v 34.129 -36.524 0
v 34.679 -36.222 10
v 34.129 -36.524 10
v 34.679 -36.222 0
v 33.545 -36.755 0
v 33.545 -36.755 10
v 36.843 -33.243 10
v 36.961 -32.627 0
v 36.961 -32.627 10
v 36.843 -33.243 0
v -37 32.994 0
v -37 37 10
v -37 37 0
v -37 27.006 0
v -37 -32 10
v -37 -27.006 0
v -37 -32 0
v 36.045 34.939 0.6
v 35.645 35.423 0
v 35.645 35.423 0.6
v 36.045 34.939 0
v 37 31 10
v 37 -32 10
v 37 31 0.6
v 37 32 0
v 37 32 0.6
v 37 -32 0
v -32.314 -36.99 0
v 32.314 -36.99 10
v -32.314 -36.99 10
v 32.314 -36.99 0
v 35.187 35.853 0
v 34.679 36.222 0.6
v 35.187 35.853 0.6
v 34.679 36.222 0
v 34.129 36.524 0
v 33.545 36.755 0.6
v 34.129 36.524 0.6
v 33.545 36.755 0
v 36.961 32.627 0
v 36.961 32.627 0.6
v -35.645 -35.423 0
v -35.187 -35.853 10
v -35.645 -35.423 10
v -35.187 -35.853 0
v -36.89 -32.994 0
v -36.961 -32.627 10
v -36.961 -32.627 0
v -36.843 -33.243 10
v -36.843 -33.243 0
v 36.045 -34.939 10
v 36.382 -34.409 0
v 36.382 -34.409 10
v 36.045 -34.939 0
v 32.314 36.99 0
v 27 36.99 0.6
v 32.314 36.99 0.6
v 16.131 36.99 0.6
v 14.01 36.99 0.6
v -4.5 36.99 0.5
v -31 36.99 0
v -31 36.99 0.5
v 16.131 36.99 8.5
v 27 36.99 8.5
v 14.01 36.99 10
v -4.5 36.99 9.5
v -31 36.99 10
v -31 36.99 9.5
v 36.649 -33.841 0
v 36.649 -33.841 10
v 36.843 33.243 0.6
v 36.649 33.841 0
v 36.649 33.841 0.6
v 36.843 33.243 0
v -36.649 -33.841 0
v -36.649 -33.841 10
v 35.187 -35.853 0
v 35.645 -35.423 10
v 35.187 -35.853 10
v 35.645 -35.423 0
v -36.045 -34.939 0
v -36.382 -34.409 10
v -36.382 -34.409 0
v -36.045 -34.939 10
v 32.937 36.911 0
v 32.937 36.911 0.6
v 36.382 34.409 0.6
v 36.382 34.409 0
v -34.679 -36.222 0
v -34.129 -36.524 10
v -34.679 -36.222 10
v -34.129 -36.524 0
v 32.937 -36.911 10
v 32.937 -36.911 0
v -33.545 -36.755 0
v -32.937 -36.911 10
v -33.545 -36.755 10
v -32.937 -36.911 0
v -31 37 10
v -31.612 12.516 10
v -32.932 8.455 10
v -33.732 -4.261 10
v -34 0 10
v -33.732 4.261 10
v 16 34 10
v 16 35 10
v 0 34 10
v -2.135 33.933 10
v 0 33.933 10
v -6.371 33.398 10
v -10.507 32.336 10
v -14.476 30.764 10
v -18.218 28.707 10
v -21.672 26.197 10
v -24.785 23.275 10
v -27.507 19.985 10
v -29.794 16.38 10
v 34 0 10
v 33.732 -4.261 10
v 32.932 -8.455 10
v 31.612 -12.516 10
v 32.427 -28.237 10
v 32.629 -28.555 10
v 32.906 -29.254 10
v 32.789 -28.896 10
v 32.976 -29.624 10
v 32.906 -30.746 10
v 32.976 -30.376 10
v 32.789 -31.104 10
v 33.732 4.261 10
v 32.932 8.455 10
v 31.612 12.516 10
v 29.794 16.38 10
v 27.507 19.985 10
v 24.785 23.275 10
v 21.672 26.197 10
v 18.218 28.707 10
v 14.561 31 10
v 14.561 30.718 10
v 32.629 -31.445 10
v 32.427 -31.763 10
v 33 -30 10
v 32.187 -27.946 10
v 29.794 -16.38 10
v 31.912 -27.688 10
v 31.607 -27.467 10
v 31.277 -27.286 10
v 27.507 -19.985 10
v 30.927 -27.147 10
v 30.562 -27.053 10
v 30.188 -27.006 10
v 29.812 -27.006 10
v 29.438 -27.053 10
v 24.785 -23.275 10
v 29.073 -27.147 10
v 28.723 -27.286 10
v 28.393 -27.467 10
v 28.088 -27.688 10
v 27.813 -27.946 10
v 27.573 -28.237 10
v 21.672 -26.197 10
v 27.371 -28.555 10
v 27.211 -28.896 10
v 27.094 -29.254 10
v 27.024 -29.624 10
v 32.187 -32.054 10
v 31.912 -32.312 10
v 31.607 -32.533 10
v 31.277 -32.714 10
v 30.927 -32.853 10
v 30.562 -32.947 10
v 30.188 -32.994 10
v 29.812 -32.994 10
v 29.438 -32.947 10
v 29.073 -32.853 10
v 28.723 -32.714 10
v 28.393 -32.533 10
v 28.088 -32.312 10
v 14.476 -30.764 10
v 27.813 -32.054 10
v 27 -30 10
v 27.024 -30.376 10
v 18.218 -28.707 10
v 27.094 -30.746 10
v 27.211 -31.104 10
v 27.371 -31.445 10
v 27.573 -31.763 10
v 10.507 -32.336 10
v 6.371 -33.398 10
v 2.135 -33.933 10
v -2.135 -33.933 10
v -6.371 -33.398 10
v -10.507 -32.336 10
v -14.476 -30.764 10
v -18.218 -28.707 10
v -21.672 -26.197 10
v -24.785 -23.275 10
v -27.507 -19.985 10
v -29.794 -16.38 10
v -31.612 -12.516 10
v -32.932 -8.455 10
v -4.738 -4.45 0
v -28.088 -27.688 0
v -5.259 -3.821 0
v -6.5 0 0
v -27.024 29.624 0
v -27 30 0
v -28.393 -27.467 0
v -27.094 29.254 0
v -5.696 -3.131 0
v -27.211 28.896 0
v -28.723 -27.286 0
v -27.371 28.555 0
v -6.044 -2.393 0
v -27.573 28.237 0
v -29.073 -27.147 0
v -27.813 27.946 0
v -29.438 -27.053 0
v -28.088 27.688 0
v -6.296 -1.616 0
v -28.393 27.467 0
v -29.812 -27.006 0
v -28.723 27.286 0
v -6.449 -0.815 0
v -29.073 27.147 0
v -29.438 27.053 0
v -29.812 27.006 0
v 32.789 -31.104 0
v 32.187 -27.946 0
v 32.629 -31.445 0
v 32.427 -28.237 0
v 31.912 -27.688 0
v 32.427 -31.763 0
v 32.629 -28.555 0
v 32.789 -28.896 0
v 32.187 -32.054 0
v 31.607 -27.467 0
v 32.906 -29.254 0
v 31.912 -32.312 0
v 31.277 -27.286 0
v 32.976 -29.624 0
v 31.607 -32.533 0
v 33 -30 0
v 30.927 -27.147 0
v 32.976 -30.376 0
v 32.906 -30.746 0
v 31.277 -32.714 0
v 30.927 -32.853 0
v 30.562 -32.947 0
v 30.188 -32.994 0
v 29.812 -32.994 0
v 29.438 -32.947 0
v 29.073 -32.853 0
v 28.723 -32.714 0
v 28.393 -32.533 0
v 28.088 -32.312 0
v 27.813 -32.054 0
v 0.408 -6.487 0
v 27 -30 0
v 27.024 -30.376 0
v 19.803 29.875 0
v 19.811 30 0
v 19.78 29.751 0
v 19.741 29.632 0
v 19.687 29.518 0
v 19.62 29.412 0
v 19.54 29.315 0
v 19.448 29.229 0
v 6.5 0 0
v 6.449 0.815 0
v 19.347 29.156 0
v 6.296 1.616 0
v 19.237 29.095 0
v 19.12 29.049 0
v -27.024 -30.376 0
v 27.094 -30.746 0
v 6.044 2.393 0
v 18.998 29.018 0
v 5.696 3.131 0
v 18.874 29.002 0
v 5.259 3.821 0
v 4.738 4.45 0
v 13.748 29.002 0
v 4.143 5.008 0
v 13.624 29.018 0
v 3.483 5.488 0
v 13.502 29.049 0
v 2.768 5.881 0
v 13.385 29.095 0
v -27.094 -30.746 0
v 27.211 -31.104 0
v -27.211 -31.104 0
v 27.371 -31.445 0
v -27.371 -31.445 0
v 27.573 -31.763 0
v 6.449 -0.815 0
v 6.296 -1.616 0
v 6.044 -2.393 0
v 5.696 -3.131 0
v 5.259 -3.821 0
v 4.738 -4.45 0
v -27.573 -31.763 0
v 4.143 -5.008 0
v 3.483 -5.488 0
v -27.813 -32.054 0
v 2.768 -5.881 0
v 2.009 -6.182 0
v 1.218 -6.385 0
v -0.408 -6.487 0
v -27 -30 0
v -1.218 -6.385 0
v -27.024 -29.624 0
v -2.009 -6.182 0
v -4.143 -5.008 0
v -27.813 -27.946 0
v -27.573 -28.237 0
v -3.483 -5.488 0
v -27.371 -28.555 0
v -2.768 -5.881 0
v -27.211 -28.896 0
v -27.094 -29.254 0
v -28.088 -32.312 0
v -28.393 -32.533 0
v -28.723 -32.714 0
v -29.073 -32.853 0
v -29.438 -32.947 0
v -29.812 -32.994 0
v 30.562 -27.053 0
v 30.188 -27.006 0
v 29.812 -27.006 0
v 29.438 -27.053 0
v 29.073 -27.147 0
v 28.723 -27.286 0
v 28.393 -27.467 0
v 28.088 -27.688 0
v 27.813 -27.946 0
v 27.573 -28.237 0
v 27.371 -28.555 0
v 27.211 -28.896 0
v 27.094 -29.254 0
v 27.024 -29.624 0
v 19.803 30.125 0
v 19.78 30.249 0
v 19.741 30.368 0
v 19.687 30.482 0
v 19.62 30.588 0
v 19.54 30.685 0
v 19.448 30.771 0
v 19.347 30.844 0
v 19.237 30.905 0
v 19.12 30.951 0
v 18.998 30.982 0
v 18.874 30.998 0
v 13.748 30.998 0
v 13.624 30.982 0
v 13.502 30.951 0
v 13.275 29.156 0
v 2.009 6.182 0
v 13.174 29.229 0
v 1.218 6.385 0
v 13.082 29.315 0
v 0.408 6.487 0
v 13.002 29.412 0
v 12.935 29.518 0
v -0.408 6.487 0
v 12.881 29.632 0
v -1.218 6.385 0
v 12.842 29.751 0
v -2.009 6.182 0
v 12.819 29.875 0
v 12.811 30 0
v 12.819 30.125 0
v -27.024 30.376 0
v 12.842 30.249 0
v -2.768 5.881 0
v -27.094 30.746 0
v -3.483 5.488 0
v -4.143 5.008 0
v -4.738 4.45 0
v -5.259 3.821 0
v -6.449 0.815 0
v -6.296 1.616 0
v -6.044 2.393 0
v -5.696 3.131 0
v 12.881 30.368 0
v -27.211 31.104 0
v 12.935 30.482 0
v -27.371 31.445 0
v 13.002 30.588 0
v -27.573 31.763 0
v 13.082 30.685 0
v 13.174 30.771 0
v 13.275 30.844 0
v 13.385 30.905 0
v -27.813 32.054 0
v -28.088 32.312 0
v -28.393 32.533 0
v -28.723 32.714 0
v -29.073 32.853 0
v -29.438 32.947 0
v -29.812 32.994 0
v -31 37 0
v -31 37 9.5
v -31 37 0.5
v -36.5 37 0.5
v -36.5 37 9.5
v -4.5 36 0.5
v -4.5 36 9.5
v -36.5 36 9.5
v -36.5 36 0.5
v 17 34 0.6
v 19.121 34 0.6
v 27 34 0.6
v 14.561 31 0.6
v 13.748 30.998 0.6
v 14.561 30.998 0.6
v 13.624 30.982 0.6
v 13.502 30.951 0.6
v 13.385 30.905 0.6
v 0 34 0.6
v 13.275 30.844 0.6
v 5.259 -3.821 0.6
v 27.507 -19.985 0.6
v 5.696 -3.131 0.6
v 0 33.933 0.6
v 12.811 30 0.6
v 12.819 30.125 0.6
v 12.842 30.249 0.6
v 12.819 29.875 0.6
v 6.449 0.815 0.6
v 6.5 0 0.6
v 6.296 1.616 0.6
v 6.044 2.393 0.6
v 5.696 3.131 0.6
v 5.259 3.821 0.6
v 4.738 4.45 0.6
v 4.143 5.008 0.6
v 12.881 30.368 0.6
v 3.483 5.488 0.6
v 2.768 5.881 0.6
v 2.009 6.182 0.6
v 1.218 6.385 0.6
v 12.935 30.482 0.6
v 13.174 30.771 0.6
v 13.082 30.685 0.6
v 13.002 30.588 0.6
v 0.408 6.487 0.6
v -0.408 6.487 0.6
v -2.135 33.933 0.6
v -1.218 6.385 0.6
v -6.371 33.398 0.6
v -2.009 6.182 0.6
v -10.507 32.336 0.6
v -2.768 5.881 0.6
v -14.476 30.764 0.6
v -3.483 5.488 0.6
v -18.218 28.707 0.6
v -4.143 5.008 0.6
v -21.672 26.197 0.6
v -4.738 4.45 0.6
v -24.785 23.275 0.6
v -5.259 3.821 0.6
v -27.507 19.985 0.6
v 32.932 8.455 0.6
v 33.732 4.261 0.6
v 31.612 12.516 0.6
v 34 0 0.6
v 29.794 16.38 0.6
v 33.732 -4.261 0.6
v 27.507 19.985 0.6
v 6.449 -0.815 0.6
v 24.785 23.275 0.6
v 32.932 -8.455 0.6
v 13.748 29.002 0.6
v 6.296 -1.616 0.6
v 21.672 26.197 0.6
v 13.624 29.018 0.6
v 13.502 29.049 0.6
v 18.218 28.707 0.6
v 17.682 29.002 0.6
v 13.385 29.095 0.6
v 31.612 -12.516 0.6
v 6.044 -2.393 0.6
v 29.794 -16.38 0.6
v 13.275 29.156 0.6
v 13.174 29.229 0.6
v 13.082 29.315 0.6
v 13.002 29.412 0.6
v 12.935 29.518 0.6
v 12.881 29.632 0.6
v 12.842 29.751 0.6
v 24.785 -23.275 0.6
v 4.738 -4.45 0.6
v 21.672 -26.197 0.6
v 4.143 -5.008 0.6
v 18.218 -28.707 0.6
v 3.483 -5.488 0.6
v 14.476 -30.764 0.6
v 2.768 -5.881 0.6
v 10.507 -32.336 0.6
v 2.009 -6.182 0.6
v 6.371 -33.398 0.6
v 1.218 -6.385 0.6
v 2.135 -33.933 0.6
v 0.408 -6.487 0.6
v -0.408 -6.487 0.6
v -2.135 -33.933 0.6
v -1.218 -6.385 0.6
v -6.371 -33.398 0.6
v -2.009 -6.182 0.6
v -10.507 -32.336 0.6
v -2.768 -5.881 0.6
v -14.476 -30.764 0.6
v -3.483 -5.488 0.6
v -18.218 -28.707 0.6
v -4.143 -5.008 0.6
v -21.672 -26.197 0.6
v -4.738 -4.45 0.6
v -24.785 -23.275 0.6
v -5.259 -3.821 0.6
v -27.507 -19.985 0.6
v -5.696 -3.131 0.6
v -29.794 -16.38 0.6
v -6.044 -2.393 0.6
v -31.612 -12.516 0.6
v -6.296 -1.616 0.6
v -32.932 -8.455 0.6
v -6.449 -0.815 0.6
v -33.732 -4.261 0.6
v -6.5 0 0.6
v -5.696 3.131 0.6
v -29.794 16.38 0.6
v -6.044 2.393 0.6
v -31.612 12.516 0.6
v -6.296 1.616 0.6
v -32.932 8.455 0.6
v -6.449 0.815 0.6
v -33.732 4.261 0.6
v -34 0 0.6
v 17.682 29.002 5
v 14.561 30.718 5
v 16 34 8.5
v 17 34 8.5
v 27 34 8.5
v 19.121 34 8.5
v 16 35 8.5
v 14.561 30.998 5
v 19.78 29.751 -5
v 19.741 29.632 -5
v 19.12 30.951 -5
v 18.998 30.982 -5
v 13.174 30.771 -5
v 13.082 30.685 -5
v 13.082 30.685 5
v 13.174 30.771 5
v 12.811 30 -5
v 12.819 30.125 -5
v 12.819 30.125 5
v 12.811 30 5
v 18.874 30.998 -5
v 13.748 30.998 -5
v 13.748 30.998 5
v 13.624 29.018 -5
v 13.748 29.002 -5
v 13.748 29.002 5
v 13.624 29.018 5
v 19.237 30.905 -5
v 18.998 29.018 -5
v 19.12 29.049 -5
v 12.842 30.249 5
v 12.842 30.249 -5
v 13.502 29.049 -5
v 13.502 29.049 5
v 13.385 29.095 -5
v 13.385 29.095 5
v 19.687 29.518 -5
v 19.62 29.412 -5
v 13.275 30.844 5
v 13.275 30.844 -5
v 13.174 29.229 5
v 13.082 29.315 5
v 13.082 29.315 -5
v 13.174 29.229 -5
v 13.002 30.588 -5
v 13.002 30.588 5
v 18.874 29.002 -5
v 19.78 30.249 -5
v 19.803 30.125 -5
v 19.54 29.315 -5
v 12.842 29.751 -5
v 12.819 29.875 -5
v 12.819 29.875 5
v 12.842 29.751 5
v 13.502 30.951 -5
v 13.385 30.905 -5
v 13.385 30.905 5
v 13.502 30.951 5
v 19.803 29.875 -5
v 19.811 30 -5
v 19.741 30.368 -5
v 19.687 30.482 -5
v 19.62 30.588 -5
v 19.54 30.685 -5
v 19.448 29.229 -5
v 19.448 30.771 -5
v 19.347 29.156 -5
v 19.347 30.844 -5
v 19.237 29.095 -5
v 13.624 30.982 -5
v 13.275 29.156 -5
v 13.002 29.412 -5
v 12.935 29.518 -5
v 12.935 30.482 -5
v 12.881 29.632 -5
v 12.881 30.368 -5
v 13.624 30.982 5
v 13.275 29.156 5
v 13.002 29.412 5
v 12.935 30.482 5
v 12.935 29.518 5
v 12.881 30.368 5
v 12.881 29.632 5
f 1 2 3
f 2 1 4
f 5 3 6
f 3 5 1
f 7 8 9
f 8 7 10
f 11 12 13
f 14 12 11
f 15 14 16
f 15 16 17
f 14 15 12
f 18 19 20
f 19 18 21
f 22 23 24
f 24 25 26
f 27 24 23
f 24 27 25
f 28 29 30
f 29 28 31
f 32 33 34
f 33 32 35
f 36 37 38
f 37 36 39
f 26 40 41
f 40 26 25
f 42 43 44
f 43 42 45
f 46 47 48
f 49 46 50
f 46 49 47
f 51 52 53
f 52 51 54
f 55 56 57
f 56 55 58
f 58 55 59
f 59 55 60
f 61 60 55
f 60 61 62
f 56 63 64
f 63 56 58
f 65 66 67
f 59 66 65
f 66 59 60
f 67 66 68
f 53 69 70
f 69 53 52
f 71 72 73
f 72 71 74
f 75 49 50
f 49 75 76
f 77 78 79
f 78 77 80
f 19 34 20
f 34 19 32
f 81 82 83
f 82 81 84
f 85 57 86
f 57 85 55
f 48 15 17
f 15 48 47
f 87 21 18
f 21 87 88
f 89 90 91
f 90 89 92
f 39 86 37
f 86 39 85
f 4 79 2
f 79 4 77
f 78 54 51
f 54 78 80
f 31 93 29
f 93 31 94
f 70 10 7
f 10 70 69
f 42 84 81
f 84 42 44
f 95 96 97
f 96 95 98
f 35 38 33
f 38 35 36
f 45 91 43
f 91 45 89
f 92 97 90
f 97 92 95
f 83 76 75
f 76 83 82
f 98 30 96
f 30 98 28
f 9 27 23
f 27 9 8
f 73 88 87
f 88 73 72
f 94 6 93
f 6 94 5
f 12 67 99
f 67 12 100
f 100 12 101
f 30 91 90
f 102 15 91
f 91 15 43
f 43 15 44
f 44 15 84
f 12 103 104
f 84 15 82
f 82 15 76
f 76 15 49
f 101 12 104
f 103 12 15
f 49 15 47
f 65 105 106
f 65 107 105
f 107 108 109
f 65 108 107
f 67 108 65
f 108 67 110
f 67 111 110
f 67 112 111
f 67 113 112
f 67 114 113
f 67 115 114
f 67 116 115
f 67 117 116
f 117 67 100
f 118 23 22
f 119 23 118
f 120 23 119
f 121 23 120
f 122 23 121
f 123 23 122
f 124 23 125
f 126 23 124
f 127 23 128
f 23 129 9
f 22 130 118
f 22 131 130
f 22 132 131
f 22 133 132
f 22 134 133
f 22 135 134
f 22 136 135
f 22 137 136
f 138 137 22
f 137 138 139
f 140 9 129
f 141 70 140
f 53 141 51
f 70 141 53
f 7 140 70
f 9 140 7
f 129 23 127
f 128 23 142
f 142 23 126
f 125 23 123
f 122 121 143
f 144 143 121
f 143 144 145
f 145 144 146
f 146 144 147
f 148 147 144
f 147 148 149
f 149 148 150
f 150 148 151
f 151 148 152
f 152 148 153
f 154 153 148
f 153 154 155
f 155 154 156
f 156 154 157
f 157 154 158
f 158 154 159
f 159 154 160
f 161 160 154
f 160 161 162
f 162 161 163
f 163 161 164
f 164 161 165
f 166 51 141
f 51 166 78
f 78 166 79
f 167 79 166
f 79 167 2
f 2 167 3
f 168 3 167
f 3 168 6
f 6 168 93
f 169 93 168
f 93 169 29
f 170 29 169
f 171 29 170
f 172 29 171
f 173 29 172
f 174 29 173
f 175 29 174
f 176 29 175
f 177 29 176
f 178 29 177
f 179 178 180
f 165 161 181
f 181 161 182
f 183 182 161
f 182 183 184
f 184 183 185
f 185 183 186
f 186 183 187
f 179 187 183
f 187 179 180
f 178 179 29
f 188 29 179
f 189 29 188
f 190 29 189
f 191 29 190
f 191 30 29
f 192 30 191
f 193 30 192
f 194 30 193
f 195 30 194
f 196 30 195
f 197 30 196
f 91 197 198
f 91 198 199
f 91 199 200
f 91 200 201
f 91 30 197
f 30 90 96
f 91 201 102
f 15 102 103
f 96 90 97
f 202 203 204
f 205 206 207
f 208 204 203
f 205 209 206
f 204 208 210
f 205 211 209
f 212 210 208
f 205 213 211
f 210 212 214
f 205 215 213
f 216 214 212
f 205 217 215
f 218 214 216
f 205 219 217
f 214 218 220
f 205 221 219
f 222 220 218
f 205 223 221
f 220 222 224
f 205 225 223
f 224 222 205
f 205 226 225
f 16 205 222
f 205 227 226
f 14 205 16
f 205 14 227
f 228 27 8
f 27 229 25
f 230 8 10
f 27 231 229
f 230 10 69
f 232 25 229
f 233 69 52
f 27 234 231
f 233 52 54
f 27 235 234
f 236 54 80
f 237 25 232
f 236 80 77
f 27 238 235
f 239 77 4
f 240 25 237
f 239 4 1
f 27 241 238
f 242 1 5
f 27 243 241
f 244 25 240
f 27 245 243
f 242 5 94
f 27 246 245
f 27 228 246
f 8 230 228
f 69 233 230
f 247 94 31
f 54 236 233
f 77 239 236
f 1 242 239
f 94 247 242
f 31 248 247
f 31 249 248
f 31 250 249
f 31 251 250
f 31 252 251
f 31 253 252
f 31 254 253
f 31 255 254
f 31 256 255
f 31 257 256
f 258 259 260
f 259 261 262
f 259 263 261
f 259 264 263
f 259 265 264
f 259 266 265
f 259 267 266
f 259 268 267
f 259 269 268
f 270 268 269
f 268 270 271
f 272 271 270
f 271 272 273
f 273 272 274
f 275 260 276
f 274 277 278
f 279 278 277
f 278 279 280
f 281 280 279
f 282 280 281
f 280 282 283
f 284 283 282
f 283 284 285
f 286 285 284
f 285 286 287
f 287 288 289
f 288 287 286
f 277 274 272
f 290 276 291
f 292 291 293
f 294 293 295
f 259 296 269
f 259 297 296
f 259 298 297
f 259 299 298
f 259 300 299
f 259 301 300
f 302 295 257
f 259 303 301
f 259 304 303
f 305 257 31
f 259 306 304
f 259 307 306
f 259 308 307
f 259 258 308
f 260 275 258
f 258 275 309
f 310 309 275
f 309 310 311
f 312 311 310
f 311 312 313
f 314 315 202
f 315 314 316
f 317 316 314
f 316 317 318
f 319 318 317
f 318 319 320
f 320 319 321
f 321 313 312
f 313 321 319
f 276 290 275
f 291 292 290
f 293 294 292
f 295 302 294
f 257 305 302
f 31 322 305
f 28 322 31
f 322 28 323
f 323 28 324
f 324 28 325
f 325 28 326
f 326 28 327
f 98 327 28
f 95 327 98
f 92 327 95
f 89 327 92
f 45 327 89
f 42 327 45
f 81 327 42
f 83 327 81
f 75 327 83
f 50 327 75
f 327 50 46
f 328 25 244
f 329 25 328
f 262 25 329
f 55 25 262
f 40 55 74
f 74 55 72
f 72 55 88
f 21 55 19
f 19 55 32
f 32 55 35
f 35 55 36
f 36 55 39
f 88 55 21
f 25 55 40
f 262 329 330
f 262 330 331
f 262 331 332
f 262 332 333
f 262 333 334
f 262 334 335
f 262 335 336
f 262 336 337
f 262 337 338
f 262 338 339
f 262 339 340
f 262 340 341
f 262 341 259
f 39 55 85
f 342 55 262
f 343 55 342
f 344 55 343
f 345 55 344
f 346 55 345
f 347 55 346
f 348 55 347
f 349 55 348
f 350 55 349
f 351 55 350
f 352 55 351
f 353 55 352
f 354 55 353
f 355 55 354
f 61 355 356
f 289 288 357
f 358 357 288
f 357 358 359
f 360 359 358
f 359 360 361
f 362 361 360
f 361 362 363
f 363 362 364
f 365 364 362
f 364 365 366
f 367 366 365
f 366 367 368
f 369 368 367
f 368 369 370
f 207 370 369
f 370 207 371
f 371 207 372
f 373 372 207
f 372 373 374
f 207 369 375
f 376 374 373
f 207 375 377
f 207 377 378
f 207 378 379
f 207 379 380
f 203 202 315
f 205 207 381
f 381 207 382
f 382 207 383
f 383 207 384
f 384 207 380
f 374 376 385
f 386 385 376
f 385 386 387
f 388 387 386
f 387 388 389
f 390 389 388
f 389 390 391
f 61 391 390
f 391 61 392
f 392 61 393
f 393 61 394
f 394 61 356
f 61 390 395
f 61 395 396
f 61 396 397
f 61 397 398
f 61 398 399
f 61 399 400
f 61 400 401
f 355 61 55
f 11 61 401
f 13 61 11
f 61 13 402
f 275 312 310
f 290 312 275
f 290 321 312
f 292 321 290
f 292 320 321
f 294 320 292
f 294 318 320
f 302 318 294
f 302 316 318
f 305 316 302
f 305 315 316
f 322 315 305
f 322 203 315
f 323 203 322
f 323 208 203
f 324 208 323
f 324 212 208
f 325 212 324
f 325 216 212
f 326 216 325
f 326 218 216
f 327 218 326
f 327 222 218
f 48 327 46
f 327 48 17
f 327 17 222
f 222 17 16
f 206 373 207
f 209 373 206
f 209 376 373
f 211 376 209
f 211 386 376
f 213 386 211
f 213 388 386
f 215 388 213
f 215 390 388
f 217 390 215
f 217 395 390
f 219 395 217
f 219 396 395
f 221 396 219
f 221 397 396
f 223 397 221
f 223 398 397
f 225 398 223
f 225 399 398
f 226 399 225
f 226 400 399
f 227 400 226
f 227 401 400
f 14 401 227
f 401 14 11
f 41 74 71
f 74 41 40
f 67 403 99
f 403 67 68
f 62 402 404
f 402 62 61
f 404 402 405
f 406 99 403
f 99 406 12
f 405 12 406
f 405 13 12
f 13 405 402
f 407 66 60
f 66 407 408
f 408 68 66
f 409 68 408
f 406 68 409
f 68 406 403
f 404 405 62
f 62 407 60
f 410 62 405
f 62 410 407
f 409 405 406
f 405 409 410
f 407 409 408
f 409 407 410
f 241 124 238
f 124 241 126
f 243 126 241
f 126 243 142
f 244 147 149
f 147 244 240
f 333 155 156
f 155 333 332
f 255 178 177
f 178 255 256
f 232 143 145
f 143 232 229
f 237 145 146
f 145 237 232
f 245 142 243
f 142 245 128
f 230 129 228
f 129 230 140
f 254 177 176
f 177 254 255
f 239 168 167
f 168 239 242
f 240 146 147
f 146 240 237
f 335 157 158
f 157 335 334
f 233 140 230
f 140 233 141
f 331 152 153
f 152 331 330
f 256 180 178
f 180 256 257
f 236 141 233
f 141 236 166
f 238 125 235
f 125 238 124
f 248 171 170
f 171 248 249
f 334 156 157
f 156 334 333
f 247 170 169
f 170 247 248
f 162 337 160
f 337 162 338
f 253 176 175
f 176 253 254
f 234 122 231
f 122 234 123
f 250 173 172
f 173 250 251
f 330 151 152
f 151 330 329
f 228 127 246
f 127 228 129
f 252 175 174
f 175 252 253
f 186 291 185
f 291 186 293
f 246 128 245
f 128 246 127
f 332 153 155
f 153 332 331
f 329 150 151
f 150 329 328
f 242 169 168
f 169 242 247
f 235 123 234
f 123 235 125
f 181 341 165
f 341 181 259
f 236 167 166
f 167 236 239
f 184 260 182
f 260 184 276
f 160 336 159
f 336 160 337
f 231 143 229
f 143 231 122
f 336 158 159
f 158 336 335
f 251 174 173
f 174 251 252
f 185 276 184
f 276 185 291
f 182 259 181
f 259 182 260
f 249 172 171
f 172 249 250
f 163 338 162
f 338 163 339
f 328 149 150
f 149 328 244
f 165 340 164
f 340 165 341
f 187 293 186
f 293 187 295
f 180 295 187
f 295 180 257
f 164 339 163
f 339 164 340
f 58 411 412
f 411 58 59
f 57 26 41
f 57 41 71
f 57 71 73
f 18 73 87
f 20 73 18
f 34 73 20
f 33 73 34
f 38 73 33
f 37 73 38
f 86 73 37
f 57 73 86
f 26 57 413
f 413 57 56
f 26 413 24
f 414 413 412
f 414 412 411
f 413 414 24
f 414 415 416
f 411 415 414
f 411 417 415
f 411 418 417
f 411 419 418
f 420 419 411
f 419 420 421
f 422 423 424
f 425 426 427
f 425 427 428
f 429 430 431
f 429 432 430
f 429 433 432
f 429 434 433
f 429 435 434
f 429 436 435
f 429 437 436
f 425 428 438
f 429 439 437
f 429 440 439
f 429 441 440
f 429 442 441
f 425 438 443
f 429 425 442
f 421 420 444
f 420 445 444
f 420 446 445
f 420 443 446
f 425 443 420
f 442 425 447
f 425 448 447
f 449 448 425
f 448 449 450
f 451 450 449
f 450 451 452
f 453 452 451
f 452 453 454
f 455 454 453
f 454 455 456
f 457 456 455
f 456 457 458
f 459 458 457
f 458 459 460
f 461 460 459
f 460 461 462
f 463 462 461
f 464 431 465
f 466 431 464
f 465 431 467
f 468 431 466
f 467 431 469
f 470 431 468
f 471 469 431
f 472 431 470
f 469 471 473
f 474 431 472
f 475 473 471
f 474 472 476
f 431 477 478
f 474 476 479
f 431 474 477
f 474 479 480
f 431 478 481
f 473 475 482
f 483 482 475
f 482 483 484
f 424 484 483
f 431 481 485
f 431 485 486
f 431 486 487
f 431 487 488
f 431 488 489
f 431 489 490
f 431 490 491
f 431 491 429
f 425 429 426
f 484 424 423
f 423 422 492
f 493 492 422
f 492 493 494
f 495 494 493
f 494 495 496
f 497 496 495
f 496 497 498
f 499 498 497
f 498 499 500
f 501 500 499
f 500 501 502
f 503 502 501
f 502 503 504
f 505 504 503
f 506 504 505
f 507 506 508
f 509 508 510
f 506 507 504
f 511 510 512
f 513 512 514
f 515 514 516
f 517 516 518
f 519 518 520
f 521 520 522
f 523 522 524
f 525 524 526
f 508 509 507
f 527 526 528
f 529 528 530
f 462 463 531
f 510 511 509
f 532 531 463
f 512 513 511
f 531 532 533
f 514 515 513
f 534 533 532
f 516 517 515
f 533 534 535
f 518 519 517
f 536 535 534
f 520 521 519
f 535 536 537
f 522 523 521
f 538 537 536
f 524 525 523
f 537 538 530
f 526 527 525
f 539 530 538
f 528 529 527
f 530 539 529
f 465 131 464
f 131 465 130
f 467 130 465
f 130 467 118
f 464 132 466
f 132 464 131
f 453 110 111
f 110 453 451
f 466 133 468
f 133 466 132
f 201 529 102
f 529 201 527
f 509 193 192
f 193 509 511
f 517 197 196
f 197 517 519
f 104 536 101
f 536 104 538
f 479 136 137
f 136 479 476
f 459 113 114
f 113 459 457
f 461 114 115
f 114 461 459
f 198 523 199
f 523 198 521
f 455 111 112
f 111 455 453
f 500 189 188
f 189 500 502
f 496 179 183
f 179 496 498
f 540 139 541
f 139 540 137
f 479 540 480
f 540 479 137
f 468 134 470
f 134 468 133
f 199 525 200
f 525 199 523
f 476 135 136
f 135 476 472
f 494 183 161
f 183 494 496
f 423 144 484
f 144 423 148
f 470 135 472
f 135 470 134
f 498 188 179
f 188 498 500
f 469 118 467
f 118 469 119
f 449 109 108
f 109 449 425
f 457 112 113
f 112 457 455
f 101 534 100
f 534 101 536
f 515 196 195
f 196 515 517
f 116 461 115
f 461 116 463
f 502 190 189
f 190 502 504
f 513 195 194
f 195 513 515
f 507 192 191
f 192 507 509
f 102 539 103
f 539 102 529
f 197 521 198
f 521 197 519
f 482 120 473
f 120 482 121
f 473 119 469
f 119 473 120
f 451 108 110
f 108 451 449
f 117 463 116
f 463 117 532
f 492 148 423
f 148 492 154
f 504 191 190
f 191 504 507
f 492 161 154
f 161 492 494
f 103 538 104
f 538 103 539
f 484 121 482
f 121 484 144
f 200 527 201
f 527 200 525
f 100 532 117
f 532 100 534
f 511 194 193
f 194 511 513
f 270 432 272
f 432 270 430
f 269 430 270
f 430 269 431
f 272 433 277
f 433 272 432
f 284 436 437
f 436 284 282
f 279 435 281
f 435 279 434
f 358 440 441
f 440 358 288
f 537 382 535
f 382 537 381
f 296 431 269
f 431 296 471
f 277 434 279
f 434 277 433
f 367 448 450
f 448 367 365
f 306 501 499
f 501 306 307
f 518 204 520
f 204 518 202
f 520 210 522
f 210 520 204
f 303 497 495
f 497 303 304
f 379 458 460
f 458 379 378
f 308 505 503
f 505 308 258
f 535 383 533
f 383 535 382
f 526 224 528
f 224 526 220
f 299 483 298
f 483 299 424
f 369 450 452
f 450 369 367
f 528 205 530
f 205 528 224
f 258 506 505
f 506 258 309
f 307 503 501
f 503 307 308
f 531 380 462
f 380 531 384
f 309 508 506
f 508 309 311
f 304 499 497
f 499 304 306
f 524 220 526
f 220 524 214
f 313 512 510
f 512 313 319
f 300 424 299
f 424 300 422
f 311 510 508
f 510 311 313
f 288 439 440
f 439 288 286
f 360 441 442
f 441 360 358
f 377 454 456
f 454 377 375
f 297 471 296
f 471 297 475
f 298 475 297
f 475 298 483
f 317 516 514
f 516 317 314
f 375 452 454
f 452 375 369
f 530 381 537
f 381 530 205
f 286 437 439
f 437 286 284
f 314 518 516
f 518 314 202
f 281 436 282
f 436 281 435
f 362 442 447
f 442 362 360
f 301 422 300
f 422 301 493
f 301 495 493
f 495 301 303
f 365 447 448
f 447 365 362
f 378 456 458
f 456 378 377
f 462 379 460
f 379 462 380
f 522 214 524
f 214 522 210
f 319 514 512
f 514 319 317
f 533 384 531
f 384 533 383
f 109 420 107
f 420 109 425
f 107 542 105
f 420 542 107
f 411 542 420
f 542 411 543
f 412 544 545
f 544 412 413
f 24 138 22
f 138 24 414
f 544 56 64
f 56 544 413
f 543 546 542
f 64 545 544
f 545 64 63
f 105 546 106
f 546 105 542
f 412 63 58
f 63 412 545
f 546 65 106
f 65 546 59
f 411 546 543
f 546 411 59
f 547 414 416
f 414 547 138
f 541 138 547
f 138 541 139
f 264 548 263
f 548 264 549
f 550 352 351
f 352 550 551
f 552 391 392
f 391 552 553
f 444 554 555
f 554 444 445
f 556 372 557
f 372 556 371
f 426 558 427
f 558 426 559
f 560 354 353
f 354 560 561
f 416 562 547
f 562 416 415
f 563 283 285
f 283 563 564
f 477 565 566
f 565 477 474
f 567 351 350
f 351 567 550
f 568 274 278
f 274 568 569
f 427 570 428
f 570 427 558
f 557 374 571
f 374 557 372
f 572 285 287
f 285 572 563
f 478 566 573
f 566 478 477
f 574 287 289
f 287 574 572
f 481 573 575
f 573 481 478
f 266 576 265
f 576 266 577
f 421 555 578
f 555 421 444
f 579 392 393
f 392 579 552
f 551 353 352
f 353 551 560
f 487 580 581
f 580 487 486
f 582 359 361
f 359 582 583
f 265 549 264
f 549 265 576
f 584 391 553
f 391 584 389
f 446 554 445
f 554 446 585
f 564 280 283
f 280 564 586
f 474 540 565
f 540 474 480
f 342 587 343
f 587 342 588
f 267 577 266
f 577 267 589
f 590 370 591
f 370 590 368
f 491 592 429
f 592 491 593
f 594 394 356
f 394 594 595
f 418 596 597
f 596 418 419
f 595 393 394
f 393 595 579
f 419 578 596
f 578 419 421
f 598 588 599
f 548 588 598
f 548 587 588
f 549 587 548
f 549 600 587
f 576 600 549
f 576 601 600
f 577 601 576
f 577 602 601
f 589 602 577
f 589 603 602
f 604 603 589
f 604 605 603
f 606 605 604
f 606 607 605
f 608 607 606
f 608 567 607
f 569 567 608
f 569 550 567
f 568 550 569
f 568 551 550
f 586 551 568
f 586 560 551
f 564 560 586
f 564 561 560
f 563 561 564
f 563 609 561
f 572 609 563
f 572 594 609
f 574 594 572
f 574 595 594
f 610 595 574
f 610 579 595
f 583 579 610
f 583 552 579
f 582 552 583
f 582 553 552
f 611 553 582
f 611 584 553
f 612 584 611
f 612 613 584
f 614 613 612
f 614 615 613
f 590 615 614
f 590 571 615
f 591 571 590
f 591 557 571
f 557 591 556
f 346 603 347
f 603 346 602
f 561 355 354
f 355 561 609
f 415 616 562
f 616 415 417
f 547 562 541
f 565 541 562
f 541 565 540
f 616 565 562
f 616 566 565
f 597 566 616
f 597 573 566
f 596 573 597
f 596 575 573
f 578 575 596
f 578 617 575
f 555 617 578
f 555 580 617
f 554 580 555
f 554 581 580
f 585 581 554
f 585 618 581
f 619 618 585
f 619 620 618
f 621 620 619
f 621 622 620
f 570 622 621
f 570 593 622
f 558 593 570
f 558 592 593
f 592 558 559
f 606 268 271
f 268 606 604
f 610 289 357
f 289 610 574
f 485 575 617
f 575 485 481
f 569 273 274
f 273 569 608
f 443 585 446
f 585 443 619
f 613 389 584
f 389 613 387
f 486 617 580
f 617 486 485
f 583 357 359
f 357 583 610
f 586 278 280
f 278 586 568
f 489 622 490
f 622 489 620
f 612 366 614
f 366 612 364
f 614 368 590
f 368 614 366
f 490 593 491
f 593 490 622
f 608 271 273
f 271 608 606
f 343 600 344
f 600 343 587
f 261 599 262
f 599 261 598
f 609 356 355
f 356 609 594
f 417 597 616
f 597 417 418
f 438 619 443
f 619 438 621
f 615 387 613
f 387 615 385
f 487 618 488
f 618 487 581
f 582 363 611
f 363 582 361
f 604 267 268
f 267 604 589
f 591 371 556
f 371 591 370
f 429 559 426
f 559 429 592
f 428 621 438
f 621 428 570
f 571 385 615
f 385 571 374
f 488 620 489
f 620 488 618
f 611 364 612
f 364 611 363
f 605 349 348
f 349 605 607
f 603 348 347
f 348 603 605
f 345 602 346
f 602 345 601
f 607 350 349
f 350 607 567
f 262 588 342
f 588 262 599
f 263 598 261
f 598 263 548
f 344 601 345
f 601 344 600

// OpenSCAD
$fn = 50;


union() {
	difference() {
		union() {
			hull() {
				translate(v = [-32.0000000000, 32.0000000000, 0]) {
					cylinder(h = 10, r = 5);
				}
				translate(v = [32.0000000000, 32.0000000000, 0]) {
					cylinder(h = 10, r = 5);
				}
				translate(v = [-32.0000000000, -32.0000000000, 0]) {
					cylinder(h = 10, r = 5);
				}
				translate(v = [32.0000000000, -32.0000000000, 0]) {
					cylinder(h = 10, r = 5);
				}
			}
			translate(v = [-37.0000000000, 31.0000000000, 0]) {
				cube(size = [6, 6, 10]);
			}
		}
		union() {
			translate(v = [-37.5000000000, -30.0000000000, -250.0000000000]) {
				rotate(a = [0, 0, 0]) {
					difference() {
						union() {
							hull() {
								translate(v = [7.5000000000, 0, 0]) {
									cylinder(h = 250, r = 3.0000000000, r1 = 3.0000000000, r2 = 3.0000000000);
								}
								translate(v = [-7.5000000000, 0, 0]) {
									cylinder(h = 250, r = 3.0000000000, r1 = 3.0000000000, r2 = 3.0000000000);
								}
							}
						}
						union();
					}
				}
			}
			translate(v = [-37.5000000000, 30.0000000000, -250.0000000000]) {
				rotate(a = [0, 0, 0]) {
					difference() {
						union() {
							hull() {
								translate(v = [7.5000000000, 0, 0]) {
									cylinder(h = 250, r = 3.0000000000, r1 = 3.0000000000, r2 = 3.0000000000);
								}
								translate(v = [-7.5000000000, 0, 0]) {
									cylinder(h = 250, r = 3.0000000000, r1 = 3.0000000000, r2 = 3.0000000000);
								}
							}
						}
						union();
					}
				}
			}
			translate(v = [-36.5000000000, 36.0000000000, 0.5000000000]) {
				cube(size = [32, 1, 9.0000000000]);
			}
			translate(v = [30.0000000000, -30.0000000000, 0]) {
				cylinder(h = 100, r = 3.0000000000);
			}
			translate(v = [0, 0, 0.6000000000]) {
				cylinder(h = 12.4000000000, r = 34.0000000000);
			}
			translate(v = [0, 0, -5.0000000000]) {
				cylinder(h = 10, r = 6.5000000000);
			}
			translate(v = [0.0000000000, 31.0000000000, 0.6000000000]) {
				cube(size = [37.0000000000, 3, 12.4000000000]);
			}
			translate(v = [27.0000000000, 31.0000000000, 0.6000000000]) {
				cube(size = [10, 6, 12.4000000000]);
			}
			translate(v = [16.0000000000, 31.0000000000, 8.5000000000]) {
				cube(size = [21, 6, 1.5000000000]);
			}
			translate(v = [13.2500000000, 37.7500000000, 0.6000000000]) {
				rotate(a = [0, 0, -45]) {
					cube(size = [7.5000000000, 1.5000000000, 12.4000000000]);
				}
			}
			translate(v = [7.0610000000, 29.0000000000, 0.6000000000]) {
				cube(size = [7.5000000000, 2, 9.4000000000]);
			}
		}
	}
	union() {
		translate(v = [16.3110000000, 30.0000000000, -5.0000000000]) {
			rotate(a = [0, 0, 0]) {
				difference() {
					union() {
						#hull() {
							#translate(v = [2.5000000000, 0, 0]) {
								cylinder(h = 10, r = 1.0000000000, r1 = 1.0000000000, r2 = 1.0000000000);
							}
							#translate(v = [-2.5000000000, 0, 0]) {
								cylinder(h = 10, r = 1.0000000000, r1 = 1.0000000000, r2 = 1.0000000000);
							}
						}
					}
					union();
				}
			}
		}
	}
}
